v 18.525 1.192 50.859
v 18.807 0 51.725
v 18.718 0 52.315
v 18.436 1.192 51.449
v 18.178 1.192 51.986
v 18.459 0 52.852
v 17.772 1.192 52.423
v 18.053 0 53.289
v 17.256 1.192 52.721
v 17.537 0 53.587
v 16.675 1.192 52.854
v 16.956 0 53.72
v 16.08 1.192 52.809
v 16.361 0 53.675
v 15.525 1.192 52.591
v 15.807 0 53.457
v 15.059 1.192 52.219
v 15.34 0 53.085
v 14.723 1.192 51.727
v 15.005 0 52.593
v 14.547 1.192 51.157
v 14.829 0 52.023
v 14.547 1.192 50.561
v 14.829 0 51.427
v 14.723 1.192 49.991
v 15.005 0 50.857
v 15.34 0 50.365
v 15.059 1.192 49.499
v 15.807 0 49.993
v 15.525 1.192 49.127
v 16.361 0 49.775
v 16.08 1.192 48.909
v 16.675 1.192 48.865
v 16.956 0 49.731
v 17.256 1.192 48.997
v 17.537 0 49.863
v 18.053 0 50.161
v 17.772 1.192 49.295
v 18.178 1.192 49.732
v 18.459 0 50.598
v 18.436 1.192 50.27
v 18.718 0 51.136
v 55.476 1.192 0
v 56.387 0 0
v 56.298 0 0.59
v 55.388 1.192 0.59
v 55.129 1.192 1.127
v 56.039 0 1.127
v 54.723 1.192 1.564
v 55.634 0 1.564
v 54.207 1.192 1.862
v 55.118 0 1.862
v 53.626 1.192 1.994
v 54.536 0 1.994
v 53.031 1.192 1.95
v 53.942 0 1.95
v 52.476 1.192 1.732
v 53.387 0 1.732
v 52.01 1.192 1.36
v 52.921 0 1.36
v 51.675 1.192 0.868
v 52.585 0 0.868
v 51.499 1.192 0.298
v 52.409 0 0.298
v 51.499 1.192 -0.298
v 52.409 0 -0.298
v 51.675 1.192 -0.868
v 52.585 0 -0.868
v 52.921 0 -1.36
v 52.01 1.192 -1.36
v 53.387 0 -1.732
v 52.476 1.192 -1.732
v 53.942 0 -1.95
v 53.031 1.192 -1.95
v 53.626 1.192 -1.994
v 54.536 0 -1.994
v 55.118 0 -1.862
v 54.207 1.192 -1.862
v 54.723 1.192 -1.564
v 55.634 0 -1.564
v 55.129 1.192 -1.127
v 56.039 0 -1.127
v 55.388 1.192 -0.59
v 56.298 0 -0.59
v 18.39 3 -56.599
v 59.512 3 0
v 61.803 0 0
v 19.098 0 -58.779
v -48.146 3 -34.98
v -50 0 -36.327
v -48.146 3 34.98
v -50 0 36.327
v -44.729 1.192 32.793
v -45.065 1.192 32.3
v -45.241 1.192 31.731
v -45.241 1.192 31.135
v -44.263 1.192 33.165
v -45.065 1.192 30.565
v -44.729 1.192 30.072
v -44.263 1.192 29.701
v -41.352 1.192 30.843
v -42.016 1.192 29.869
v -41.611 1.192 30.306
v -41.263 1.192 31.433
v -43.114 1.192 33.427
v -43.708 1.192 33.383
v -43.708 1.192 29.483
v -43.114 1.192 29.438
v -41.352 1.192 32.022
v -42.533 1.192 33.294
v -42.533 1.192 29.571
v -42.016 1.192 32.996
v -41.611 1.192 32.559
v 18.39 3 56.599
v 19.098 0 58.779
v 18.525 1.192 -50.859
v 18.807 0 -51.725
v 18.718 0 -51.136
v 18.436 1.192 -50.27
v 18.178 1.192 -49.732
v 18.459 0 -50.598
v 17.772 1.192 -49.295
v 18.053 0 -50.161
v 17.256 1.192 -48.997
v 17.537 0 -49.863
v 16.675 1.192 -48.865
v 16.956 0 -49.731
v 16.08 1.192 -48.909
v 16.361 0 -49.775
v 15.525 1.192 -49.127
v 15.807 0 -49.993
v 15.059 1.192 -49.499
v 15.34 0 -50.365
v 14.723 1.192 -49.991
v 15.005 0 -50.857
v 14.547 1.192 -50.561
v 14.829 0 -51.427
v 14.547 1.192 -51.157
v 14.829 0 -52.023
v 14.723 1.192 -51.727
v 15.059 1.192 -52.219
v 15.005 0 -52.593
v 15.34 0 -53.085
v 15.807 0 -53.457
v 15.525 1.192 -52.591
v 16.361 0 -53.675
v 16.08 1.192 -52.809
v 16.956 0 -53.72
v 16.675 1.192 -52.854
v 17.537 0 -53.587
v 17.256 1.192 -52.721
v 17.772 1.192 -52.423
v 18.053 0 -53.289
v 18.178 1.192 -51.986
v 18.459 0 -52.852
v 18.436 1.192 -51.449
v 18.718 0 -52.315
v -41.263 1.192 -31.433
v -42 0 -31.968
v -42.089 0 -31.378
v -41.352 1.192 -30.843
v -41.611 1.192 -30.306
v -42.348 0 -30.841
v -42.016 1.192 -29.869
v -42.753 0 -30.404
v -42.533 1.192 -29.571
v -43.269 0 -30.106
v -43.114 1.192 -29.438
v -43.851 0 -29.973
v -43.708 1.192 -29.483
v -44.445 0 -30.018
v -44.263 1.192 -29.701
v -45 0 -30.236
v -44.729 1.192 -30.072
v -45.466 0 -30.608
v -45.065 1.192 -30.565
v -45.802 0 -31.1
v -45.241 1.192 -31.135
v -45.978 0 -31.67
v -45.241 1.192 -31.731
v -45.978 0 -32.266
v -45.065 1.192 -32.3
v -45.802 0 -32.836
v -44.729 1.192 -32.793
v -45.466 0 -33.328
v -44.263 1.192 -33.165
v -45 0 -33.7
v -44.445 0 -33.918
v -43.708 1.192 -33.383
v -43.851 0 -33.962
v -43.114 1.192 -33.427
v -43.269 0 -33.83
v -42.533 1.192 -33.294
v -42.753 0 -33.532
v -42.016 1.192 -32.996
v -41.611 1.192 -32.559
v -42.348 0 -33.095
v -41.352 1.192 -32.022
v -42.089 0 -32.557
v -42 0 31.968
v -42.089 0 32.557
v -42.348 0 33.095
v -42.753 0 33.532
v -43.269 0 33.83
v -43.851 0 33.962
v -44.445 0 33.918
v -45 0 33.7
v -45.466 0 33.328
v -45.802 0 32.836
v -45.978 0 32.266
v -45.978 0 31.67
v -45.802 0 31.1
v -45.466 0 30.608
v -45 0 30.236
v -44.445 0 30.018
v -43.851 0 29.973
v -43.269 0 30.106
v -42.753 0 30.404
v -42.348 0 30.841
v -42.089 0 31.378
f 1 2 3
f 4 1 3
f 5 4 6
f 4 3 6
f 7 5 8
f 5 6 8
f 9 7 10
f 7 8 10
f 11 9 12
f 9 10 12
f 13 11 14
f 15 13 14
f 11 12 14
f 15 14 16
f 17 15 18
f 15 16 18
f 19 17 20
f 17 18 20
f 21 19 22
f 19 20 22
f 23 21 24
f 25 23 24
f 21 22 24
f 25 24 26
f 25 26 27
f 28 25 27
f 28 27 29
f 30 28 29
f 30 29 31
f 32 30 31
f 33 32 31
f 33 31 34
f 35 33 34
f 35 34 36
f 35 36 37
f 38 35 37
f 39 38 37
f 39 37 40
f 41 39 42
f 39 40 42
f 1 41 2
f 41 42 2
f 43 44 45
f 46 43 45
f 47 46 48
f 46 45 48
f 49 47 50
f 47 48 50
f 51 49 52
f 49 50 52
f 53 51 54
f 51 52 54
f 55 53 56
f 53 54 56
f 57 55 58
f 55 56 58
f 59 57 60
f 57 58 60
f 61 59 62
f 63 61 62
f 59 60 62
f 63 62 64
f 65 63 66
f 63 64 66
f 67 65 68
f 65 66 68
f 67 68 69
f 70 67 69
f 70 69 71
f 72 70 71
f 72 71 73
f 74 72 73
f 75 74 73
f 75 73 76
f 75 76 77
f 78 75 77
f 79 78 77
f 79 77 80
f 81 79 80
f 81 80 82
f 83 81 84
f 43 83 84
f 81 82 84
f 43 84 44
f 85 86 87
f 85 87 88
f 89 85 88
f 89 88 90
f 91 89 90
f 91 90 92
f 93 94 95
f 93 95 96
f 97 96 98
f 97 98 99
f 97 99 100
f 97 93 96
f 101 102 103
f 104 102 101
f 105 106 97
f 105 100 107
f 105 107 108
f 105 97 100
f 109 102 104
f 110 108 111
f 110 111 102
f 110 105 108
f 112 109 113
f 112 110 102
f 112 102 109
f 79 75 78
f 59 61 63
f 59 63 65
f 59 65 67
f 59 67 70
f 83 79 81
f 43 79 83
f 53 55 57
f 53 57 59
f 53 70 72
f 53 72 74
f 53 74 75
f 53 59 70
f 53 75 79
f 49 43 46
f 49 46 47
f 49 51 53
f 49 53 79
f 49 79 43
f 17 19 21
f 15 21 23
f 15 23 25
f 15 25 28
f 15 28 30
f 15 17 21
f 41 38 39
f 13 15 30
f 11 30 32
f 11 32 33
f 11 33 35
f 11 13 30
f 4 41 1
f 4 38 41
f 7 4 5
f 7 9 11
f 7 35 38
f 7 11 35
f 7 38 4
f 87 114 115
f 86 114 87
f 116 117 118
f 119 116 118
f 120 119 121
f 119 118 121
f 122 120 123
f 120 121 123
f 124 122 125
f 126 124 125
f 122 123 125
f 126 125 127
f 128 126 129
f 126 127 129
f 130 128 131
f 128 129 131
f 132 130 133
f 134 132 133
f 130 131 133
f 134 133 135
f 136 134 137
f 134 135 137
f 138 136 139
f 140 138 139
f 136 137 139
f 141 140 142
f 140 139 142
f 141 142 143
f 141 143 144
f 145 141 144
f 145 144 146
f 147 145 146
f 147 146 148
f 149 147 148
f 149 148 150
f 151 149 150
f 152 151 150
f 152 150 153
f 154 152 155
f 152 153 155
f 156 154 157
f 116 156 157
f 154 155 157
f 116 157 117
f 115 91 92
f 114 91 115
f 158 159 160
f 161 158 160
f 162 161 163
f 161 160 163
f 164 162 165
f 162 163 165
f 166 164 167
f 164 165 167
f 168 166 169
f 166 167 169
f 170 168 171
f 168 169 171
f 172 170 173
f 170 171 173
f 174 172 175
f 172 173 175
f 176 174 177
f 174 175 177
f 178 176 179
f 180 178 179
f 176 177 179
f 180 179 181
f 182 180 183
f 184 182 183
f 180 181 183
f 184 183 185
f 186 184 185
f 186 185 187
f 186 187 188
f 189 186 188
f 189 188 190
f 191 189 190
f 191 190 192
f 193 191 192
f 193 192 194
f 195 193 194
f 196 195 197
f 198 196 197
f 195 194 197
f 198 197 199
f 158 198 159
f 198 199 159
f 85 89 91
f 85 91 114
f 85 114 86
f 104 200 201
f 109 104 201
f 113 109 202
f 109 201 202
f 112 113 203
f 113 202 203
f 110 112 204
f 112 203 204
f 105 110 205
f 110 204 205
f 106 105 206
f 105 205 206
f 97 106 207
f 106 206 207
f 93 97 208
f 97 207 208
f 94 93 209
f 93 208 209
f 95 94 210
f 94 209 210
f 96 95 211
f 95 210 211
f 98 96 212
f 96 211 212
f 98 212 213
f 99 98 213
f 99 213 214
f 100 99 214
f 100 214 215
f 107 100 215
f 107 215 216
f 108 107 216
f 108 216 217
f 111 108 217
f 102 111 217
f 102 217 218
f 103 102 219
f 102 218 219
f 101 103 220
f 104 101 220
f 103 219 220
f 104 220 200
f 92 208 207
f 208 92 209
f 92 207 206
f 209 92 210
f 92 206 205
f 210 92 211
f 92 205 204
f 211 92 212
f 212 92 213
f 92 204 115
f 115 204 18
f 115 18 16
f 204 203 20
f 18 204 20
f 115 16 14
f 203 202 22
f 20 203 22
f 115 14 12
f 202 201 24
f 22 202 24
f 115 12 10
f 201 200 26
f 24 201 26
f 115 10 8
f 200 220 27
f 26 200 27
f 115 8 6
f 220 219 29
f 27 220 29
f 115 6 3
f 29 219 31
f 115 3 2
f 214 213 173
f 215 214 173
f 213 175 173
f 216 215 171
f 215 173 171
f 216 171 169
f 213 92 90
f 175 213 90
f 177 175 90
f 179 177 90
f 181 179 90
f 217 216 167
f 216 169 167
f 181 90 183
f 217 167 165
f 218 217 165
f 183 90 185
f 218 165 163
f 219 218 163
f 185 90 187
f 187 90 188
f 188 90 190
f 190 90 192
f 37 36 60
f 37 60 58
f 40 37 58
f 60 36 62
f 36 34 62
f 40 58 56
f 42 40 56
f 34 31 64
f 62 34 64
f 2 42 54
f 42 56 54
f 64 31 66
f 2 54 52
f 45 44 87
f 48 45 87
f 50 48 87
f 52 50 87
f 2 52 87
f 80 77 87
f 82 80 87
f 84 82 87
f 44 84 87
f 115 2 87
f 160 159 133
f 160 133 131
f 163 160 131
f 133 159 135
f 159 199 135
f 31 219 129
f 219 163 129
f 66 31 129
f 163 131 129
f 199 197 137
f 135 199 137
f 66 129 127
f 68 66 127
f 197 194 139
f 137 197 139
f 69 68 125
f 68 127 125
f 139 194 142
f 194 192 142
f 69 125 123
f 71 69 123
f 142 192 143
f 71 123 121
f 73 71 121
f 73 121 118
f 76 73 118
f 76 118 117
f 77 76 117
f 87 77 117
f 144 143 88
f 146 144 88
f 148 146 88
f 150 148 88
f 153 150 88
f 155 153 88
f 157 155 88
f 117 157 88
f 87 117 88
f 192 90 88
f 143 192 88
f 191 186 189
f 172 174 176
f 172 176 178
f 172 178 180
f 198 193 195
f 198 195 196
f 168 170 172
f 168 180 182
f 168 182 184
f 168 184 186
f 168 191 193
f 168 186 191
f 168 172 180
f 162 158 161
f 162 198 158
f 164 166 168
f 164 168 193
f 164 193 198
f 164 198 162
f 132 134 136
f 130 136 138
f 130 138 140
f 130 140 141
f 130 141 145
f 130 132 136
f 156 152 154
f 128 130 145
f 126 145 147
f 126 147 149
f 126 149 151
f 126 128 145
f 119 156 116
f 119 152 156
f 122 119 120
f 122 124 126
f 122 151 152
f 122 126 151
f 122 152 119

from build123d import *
from OCP.BRepFilletAPI import BRepFilletAPI_MakeChamfer

# Parameters (mm, degrees)
BOSS_EXTRUDE1_DEPTH = 3
CHAMFER1_SIZE       = 3
CHAMFER1_SIZE_2     = 1.853922924
SKETCH7_R           = 2
CUT_EXTRUDE6_DEPTH  = 1.5
SKETCH9_R           = 2
CUT_EXTRUDE7_DEPTH  = 1.5
SKETCH12_R          = 2
CUT_EXTRUDE8_DEPTH  = 1.5
SKETCH11_R          = 2
CUT_EXTRUDE9_DEPTH  = 1.5
SKETCH10_R          = 2
CUT_EXTRUDE10_DEPTH = 1.5


with BuildPart() as part:
    # Sketch1 → Boss-Extrude1 (new body)
    with BuildSketch(Plane(origin=(0, 0, 0), x_dir=(1, 0, 0), z_dir=(0, 1, 0))):
        Polygon((61.803398875, 0), (19.098300563, 58.778525229), (-50, 36.3271264), (-50, -36.3271264), (19.098300563, -58.778525229), align=None)
    extrude(amount=BOSS_EXTRUDE1_DEPTH)

    # Chamfer1
    chamfer1_edges_1 = [part.edges().sort_by_distance(p)[0] for p in [
        (-50, 3, 0),
    ]]
    chamfer1_side_1 = [part.faces().sort_by_distance(p)[0] for p in [
        (-50, 2.962921542, 0),
    ]]
    chamfer1_edges_2 = [part.edges().sort_by_distance(p)[0] for p in [
        (-15.450849719, 3, -47.552825815),
    ]]
    chamfer1_side_2 = [part.faces().sort_by_distance(p)[0] for p in [
        (-15.450849719, 2.962921542, -47.552825815),
    ]]
    chamfer1_edges_3 = [part.edges().sort_by_distance(p)[0] for p in [
        (40.450849719, 3, -29.389262615),
    ]]
    chamfer1_side_3 = [part.faces().sort_by_distance(p)[0] for p in [
        (40.450849719, 2.962921542, -29.389262615),
    ]]
    chamfer1_edges_4 = [part.edges().sort_by_distance(p)[0] for p in [
        (40.450849719, 3, 29.389262615),
    ]]
    chamfer1_side_4 = [part.faces().sort_by_distance(p)[0] for p in [
        (40.450849719, 2.962921542, 29.389262615),
    ]]
    chamfer1_edges_5 = [part.edges().sort_by_distance(p)[0] for p in [
        (-15.450849719, 3, 47.552825815),
    ]]
    chamfer1_side_5 = [part.faces().sort_by_distance(p)[0] for p in [
        (-15.450849719, 2.962921542, 47.552825815),
    ]]
    chamfer1 = BRepFilletAPI_MakeChamfer(part.part.solid().wrapped)
    for e in chamfer1_edges_1:
        chamfer1.Add(CHAMFER1_SIZE - 0.0001, CHAMFER1_SIZE_2 - 0.0001, e.wrapped, chamfer1_side_1[0].wrapped)
    for e in chamfer1_edges_2:
        chamfer1.Add(CHAMFER1_SIZE - 0.0001, CHAMFER1_SIZE_2 - 0.0001, e.wrapped, chamfer1_side_2[0].wrapped)
    for e in chamfer1_edges_3:
        chamfer1.Add(CHAMFER1_SIZE - 0.0001, CHAMFER1_SIZE_2 - 0.0001, e.wrapped, chamfer1_side_3[0].wrapped)
    for e in chamfer1_edges_4:
        chamfer1.Add(CHAMFER1_SIZE - 0.0001, CHAMFER1_SIZE_2 - 0.0001, e.wrapped, chamfer1_side_4[0].wrapped)
    for e in chamfer1_edges_5:
        chamfer1.Add(CHAMFER1_SIZE - 0.0001, CHAMFER1_SIZE_2 - 0.0001, e.wrapped, chamfer1_side_5[0].wrapped)
    add(Compound.cast(chamfer1.Shape()), mode=Mode.REPLACE)  # a hair under: the kernel refuses the full size

    # Sketch7 → Cut-Extrude6 (cut, along a direction that is not the sketch's normal)
    with BuildSketch(Plane.XZ):
        with Locations((16.806504495, -51.725102202)):
            Circle(SKETCH7_R)
    extrude(amount=-CUT_EXTRUDE6_DEPTH, dir=(0.18758103429764753, -0.7946827516361076, -0.5773150611441635), mode=Mode.SUBTRACT)

    # Sketch9 → Cut-Extrude7 (cut, along a direction that is not the sketch's normal)
    with BuildSketch(Plane.XZ):
        with Locations((-44, -31.967871232)):
            Circle(SKETCH9_R)
    extrude(amount=-CUT_EXTRUDE7_DEPTH, dir=(-0.4910935234360889, -0.7946827516361092, -0.356800330004317), mode=Mode.SUBTRACT)

    # Sketch12 → Cut-Extrude8 (cut, along a direction that is not the sketch's normal)
    with BuildSketch(Plane.XZ):
        with Locations((-44, 31.967871232)):
            Circle(SKETCH12_R)
    extrude(amount=-CUT_EXTRUDE8_DEPTH, dir=(-0.4910935234360893, -0.7946827516361098, 0.35680033000431516), mode=Mode.SUBTRACT)

    # Sketch11 → Cut-Extrude9 (cut, along a direction that is not the sketch's normal)
    with BuildSketch(Plane.XZ):
        with Locations((16.806504495, 51.725102202)):
            Circle(SKETCH11_R)
    extrude(amount=-CUT_EXTRUDE9_DEPTH, dir=(0.18758103429764547, -0.7946827516361094, 0.577315061144162), mode=Mode.SUBTRACT)

    # Sketch10 → Cut-Extrude10 (cut, along a direction that is not the sketch's normal)
    with BuildSketch(Plane.XZ):
        with Locations((54.38699101, 0)):
            Circle(SKETCH10_R)
    extrude(amount=-CUT_EXTRUDE10_DEPTH, dir=(0.607024978276895, -0.7946827516361074, -2.948455894095108e-15), mode=Mode.SUBTRACT)


solid = part.part
